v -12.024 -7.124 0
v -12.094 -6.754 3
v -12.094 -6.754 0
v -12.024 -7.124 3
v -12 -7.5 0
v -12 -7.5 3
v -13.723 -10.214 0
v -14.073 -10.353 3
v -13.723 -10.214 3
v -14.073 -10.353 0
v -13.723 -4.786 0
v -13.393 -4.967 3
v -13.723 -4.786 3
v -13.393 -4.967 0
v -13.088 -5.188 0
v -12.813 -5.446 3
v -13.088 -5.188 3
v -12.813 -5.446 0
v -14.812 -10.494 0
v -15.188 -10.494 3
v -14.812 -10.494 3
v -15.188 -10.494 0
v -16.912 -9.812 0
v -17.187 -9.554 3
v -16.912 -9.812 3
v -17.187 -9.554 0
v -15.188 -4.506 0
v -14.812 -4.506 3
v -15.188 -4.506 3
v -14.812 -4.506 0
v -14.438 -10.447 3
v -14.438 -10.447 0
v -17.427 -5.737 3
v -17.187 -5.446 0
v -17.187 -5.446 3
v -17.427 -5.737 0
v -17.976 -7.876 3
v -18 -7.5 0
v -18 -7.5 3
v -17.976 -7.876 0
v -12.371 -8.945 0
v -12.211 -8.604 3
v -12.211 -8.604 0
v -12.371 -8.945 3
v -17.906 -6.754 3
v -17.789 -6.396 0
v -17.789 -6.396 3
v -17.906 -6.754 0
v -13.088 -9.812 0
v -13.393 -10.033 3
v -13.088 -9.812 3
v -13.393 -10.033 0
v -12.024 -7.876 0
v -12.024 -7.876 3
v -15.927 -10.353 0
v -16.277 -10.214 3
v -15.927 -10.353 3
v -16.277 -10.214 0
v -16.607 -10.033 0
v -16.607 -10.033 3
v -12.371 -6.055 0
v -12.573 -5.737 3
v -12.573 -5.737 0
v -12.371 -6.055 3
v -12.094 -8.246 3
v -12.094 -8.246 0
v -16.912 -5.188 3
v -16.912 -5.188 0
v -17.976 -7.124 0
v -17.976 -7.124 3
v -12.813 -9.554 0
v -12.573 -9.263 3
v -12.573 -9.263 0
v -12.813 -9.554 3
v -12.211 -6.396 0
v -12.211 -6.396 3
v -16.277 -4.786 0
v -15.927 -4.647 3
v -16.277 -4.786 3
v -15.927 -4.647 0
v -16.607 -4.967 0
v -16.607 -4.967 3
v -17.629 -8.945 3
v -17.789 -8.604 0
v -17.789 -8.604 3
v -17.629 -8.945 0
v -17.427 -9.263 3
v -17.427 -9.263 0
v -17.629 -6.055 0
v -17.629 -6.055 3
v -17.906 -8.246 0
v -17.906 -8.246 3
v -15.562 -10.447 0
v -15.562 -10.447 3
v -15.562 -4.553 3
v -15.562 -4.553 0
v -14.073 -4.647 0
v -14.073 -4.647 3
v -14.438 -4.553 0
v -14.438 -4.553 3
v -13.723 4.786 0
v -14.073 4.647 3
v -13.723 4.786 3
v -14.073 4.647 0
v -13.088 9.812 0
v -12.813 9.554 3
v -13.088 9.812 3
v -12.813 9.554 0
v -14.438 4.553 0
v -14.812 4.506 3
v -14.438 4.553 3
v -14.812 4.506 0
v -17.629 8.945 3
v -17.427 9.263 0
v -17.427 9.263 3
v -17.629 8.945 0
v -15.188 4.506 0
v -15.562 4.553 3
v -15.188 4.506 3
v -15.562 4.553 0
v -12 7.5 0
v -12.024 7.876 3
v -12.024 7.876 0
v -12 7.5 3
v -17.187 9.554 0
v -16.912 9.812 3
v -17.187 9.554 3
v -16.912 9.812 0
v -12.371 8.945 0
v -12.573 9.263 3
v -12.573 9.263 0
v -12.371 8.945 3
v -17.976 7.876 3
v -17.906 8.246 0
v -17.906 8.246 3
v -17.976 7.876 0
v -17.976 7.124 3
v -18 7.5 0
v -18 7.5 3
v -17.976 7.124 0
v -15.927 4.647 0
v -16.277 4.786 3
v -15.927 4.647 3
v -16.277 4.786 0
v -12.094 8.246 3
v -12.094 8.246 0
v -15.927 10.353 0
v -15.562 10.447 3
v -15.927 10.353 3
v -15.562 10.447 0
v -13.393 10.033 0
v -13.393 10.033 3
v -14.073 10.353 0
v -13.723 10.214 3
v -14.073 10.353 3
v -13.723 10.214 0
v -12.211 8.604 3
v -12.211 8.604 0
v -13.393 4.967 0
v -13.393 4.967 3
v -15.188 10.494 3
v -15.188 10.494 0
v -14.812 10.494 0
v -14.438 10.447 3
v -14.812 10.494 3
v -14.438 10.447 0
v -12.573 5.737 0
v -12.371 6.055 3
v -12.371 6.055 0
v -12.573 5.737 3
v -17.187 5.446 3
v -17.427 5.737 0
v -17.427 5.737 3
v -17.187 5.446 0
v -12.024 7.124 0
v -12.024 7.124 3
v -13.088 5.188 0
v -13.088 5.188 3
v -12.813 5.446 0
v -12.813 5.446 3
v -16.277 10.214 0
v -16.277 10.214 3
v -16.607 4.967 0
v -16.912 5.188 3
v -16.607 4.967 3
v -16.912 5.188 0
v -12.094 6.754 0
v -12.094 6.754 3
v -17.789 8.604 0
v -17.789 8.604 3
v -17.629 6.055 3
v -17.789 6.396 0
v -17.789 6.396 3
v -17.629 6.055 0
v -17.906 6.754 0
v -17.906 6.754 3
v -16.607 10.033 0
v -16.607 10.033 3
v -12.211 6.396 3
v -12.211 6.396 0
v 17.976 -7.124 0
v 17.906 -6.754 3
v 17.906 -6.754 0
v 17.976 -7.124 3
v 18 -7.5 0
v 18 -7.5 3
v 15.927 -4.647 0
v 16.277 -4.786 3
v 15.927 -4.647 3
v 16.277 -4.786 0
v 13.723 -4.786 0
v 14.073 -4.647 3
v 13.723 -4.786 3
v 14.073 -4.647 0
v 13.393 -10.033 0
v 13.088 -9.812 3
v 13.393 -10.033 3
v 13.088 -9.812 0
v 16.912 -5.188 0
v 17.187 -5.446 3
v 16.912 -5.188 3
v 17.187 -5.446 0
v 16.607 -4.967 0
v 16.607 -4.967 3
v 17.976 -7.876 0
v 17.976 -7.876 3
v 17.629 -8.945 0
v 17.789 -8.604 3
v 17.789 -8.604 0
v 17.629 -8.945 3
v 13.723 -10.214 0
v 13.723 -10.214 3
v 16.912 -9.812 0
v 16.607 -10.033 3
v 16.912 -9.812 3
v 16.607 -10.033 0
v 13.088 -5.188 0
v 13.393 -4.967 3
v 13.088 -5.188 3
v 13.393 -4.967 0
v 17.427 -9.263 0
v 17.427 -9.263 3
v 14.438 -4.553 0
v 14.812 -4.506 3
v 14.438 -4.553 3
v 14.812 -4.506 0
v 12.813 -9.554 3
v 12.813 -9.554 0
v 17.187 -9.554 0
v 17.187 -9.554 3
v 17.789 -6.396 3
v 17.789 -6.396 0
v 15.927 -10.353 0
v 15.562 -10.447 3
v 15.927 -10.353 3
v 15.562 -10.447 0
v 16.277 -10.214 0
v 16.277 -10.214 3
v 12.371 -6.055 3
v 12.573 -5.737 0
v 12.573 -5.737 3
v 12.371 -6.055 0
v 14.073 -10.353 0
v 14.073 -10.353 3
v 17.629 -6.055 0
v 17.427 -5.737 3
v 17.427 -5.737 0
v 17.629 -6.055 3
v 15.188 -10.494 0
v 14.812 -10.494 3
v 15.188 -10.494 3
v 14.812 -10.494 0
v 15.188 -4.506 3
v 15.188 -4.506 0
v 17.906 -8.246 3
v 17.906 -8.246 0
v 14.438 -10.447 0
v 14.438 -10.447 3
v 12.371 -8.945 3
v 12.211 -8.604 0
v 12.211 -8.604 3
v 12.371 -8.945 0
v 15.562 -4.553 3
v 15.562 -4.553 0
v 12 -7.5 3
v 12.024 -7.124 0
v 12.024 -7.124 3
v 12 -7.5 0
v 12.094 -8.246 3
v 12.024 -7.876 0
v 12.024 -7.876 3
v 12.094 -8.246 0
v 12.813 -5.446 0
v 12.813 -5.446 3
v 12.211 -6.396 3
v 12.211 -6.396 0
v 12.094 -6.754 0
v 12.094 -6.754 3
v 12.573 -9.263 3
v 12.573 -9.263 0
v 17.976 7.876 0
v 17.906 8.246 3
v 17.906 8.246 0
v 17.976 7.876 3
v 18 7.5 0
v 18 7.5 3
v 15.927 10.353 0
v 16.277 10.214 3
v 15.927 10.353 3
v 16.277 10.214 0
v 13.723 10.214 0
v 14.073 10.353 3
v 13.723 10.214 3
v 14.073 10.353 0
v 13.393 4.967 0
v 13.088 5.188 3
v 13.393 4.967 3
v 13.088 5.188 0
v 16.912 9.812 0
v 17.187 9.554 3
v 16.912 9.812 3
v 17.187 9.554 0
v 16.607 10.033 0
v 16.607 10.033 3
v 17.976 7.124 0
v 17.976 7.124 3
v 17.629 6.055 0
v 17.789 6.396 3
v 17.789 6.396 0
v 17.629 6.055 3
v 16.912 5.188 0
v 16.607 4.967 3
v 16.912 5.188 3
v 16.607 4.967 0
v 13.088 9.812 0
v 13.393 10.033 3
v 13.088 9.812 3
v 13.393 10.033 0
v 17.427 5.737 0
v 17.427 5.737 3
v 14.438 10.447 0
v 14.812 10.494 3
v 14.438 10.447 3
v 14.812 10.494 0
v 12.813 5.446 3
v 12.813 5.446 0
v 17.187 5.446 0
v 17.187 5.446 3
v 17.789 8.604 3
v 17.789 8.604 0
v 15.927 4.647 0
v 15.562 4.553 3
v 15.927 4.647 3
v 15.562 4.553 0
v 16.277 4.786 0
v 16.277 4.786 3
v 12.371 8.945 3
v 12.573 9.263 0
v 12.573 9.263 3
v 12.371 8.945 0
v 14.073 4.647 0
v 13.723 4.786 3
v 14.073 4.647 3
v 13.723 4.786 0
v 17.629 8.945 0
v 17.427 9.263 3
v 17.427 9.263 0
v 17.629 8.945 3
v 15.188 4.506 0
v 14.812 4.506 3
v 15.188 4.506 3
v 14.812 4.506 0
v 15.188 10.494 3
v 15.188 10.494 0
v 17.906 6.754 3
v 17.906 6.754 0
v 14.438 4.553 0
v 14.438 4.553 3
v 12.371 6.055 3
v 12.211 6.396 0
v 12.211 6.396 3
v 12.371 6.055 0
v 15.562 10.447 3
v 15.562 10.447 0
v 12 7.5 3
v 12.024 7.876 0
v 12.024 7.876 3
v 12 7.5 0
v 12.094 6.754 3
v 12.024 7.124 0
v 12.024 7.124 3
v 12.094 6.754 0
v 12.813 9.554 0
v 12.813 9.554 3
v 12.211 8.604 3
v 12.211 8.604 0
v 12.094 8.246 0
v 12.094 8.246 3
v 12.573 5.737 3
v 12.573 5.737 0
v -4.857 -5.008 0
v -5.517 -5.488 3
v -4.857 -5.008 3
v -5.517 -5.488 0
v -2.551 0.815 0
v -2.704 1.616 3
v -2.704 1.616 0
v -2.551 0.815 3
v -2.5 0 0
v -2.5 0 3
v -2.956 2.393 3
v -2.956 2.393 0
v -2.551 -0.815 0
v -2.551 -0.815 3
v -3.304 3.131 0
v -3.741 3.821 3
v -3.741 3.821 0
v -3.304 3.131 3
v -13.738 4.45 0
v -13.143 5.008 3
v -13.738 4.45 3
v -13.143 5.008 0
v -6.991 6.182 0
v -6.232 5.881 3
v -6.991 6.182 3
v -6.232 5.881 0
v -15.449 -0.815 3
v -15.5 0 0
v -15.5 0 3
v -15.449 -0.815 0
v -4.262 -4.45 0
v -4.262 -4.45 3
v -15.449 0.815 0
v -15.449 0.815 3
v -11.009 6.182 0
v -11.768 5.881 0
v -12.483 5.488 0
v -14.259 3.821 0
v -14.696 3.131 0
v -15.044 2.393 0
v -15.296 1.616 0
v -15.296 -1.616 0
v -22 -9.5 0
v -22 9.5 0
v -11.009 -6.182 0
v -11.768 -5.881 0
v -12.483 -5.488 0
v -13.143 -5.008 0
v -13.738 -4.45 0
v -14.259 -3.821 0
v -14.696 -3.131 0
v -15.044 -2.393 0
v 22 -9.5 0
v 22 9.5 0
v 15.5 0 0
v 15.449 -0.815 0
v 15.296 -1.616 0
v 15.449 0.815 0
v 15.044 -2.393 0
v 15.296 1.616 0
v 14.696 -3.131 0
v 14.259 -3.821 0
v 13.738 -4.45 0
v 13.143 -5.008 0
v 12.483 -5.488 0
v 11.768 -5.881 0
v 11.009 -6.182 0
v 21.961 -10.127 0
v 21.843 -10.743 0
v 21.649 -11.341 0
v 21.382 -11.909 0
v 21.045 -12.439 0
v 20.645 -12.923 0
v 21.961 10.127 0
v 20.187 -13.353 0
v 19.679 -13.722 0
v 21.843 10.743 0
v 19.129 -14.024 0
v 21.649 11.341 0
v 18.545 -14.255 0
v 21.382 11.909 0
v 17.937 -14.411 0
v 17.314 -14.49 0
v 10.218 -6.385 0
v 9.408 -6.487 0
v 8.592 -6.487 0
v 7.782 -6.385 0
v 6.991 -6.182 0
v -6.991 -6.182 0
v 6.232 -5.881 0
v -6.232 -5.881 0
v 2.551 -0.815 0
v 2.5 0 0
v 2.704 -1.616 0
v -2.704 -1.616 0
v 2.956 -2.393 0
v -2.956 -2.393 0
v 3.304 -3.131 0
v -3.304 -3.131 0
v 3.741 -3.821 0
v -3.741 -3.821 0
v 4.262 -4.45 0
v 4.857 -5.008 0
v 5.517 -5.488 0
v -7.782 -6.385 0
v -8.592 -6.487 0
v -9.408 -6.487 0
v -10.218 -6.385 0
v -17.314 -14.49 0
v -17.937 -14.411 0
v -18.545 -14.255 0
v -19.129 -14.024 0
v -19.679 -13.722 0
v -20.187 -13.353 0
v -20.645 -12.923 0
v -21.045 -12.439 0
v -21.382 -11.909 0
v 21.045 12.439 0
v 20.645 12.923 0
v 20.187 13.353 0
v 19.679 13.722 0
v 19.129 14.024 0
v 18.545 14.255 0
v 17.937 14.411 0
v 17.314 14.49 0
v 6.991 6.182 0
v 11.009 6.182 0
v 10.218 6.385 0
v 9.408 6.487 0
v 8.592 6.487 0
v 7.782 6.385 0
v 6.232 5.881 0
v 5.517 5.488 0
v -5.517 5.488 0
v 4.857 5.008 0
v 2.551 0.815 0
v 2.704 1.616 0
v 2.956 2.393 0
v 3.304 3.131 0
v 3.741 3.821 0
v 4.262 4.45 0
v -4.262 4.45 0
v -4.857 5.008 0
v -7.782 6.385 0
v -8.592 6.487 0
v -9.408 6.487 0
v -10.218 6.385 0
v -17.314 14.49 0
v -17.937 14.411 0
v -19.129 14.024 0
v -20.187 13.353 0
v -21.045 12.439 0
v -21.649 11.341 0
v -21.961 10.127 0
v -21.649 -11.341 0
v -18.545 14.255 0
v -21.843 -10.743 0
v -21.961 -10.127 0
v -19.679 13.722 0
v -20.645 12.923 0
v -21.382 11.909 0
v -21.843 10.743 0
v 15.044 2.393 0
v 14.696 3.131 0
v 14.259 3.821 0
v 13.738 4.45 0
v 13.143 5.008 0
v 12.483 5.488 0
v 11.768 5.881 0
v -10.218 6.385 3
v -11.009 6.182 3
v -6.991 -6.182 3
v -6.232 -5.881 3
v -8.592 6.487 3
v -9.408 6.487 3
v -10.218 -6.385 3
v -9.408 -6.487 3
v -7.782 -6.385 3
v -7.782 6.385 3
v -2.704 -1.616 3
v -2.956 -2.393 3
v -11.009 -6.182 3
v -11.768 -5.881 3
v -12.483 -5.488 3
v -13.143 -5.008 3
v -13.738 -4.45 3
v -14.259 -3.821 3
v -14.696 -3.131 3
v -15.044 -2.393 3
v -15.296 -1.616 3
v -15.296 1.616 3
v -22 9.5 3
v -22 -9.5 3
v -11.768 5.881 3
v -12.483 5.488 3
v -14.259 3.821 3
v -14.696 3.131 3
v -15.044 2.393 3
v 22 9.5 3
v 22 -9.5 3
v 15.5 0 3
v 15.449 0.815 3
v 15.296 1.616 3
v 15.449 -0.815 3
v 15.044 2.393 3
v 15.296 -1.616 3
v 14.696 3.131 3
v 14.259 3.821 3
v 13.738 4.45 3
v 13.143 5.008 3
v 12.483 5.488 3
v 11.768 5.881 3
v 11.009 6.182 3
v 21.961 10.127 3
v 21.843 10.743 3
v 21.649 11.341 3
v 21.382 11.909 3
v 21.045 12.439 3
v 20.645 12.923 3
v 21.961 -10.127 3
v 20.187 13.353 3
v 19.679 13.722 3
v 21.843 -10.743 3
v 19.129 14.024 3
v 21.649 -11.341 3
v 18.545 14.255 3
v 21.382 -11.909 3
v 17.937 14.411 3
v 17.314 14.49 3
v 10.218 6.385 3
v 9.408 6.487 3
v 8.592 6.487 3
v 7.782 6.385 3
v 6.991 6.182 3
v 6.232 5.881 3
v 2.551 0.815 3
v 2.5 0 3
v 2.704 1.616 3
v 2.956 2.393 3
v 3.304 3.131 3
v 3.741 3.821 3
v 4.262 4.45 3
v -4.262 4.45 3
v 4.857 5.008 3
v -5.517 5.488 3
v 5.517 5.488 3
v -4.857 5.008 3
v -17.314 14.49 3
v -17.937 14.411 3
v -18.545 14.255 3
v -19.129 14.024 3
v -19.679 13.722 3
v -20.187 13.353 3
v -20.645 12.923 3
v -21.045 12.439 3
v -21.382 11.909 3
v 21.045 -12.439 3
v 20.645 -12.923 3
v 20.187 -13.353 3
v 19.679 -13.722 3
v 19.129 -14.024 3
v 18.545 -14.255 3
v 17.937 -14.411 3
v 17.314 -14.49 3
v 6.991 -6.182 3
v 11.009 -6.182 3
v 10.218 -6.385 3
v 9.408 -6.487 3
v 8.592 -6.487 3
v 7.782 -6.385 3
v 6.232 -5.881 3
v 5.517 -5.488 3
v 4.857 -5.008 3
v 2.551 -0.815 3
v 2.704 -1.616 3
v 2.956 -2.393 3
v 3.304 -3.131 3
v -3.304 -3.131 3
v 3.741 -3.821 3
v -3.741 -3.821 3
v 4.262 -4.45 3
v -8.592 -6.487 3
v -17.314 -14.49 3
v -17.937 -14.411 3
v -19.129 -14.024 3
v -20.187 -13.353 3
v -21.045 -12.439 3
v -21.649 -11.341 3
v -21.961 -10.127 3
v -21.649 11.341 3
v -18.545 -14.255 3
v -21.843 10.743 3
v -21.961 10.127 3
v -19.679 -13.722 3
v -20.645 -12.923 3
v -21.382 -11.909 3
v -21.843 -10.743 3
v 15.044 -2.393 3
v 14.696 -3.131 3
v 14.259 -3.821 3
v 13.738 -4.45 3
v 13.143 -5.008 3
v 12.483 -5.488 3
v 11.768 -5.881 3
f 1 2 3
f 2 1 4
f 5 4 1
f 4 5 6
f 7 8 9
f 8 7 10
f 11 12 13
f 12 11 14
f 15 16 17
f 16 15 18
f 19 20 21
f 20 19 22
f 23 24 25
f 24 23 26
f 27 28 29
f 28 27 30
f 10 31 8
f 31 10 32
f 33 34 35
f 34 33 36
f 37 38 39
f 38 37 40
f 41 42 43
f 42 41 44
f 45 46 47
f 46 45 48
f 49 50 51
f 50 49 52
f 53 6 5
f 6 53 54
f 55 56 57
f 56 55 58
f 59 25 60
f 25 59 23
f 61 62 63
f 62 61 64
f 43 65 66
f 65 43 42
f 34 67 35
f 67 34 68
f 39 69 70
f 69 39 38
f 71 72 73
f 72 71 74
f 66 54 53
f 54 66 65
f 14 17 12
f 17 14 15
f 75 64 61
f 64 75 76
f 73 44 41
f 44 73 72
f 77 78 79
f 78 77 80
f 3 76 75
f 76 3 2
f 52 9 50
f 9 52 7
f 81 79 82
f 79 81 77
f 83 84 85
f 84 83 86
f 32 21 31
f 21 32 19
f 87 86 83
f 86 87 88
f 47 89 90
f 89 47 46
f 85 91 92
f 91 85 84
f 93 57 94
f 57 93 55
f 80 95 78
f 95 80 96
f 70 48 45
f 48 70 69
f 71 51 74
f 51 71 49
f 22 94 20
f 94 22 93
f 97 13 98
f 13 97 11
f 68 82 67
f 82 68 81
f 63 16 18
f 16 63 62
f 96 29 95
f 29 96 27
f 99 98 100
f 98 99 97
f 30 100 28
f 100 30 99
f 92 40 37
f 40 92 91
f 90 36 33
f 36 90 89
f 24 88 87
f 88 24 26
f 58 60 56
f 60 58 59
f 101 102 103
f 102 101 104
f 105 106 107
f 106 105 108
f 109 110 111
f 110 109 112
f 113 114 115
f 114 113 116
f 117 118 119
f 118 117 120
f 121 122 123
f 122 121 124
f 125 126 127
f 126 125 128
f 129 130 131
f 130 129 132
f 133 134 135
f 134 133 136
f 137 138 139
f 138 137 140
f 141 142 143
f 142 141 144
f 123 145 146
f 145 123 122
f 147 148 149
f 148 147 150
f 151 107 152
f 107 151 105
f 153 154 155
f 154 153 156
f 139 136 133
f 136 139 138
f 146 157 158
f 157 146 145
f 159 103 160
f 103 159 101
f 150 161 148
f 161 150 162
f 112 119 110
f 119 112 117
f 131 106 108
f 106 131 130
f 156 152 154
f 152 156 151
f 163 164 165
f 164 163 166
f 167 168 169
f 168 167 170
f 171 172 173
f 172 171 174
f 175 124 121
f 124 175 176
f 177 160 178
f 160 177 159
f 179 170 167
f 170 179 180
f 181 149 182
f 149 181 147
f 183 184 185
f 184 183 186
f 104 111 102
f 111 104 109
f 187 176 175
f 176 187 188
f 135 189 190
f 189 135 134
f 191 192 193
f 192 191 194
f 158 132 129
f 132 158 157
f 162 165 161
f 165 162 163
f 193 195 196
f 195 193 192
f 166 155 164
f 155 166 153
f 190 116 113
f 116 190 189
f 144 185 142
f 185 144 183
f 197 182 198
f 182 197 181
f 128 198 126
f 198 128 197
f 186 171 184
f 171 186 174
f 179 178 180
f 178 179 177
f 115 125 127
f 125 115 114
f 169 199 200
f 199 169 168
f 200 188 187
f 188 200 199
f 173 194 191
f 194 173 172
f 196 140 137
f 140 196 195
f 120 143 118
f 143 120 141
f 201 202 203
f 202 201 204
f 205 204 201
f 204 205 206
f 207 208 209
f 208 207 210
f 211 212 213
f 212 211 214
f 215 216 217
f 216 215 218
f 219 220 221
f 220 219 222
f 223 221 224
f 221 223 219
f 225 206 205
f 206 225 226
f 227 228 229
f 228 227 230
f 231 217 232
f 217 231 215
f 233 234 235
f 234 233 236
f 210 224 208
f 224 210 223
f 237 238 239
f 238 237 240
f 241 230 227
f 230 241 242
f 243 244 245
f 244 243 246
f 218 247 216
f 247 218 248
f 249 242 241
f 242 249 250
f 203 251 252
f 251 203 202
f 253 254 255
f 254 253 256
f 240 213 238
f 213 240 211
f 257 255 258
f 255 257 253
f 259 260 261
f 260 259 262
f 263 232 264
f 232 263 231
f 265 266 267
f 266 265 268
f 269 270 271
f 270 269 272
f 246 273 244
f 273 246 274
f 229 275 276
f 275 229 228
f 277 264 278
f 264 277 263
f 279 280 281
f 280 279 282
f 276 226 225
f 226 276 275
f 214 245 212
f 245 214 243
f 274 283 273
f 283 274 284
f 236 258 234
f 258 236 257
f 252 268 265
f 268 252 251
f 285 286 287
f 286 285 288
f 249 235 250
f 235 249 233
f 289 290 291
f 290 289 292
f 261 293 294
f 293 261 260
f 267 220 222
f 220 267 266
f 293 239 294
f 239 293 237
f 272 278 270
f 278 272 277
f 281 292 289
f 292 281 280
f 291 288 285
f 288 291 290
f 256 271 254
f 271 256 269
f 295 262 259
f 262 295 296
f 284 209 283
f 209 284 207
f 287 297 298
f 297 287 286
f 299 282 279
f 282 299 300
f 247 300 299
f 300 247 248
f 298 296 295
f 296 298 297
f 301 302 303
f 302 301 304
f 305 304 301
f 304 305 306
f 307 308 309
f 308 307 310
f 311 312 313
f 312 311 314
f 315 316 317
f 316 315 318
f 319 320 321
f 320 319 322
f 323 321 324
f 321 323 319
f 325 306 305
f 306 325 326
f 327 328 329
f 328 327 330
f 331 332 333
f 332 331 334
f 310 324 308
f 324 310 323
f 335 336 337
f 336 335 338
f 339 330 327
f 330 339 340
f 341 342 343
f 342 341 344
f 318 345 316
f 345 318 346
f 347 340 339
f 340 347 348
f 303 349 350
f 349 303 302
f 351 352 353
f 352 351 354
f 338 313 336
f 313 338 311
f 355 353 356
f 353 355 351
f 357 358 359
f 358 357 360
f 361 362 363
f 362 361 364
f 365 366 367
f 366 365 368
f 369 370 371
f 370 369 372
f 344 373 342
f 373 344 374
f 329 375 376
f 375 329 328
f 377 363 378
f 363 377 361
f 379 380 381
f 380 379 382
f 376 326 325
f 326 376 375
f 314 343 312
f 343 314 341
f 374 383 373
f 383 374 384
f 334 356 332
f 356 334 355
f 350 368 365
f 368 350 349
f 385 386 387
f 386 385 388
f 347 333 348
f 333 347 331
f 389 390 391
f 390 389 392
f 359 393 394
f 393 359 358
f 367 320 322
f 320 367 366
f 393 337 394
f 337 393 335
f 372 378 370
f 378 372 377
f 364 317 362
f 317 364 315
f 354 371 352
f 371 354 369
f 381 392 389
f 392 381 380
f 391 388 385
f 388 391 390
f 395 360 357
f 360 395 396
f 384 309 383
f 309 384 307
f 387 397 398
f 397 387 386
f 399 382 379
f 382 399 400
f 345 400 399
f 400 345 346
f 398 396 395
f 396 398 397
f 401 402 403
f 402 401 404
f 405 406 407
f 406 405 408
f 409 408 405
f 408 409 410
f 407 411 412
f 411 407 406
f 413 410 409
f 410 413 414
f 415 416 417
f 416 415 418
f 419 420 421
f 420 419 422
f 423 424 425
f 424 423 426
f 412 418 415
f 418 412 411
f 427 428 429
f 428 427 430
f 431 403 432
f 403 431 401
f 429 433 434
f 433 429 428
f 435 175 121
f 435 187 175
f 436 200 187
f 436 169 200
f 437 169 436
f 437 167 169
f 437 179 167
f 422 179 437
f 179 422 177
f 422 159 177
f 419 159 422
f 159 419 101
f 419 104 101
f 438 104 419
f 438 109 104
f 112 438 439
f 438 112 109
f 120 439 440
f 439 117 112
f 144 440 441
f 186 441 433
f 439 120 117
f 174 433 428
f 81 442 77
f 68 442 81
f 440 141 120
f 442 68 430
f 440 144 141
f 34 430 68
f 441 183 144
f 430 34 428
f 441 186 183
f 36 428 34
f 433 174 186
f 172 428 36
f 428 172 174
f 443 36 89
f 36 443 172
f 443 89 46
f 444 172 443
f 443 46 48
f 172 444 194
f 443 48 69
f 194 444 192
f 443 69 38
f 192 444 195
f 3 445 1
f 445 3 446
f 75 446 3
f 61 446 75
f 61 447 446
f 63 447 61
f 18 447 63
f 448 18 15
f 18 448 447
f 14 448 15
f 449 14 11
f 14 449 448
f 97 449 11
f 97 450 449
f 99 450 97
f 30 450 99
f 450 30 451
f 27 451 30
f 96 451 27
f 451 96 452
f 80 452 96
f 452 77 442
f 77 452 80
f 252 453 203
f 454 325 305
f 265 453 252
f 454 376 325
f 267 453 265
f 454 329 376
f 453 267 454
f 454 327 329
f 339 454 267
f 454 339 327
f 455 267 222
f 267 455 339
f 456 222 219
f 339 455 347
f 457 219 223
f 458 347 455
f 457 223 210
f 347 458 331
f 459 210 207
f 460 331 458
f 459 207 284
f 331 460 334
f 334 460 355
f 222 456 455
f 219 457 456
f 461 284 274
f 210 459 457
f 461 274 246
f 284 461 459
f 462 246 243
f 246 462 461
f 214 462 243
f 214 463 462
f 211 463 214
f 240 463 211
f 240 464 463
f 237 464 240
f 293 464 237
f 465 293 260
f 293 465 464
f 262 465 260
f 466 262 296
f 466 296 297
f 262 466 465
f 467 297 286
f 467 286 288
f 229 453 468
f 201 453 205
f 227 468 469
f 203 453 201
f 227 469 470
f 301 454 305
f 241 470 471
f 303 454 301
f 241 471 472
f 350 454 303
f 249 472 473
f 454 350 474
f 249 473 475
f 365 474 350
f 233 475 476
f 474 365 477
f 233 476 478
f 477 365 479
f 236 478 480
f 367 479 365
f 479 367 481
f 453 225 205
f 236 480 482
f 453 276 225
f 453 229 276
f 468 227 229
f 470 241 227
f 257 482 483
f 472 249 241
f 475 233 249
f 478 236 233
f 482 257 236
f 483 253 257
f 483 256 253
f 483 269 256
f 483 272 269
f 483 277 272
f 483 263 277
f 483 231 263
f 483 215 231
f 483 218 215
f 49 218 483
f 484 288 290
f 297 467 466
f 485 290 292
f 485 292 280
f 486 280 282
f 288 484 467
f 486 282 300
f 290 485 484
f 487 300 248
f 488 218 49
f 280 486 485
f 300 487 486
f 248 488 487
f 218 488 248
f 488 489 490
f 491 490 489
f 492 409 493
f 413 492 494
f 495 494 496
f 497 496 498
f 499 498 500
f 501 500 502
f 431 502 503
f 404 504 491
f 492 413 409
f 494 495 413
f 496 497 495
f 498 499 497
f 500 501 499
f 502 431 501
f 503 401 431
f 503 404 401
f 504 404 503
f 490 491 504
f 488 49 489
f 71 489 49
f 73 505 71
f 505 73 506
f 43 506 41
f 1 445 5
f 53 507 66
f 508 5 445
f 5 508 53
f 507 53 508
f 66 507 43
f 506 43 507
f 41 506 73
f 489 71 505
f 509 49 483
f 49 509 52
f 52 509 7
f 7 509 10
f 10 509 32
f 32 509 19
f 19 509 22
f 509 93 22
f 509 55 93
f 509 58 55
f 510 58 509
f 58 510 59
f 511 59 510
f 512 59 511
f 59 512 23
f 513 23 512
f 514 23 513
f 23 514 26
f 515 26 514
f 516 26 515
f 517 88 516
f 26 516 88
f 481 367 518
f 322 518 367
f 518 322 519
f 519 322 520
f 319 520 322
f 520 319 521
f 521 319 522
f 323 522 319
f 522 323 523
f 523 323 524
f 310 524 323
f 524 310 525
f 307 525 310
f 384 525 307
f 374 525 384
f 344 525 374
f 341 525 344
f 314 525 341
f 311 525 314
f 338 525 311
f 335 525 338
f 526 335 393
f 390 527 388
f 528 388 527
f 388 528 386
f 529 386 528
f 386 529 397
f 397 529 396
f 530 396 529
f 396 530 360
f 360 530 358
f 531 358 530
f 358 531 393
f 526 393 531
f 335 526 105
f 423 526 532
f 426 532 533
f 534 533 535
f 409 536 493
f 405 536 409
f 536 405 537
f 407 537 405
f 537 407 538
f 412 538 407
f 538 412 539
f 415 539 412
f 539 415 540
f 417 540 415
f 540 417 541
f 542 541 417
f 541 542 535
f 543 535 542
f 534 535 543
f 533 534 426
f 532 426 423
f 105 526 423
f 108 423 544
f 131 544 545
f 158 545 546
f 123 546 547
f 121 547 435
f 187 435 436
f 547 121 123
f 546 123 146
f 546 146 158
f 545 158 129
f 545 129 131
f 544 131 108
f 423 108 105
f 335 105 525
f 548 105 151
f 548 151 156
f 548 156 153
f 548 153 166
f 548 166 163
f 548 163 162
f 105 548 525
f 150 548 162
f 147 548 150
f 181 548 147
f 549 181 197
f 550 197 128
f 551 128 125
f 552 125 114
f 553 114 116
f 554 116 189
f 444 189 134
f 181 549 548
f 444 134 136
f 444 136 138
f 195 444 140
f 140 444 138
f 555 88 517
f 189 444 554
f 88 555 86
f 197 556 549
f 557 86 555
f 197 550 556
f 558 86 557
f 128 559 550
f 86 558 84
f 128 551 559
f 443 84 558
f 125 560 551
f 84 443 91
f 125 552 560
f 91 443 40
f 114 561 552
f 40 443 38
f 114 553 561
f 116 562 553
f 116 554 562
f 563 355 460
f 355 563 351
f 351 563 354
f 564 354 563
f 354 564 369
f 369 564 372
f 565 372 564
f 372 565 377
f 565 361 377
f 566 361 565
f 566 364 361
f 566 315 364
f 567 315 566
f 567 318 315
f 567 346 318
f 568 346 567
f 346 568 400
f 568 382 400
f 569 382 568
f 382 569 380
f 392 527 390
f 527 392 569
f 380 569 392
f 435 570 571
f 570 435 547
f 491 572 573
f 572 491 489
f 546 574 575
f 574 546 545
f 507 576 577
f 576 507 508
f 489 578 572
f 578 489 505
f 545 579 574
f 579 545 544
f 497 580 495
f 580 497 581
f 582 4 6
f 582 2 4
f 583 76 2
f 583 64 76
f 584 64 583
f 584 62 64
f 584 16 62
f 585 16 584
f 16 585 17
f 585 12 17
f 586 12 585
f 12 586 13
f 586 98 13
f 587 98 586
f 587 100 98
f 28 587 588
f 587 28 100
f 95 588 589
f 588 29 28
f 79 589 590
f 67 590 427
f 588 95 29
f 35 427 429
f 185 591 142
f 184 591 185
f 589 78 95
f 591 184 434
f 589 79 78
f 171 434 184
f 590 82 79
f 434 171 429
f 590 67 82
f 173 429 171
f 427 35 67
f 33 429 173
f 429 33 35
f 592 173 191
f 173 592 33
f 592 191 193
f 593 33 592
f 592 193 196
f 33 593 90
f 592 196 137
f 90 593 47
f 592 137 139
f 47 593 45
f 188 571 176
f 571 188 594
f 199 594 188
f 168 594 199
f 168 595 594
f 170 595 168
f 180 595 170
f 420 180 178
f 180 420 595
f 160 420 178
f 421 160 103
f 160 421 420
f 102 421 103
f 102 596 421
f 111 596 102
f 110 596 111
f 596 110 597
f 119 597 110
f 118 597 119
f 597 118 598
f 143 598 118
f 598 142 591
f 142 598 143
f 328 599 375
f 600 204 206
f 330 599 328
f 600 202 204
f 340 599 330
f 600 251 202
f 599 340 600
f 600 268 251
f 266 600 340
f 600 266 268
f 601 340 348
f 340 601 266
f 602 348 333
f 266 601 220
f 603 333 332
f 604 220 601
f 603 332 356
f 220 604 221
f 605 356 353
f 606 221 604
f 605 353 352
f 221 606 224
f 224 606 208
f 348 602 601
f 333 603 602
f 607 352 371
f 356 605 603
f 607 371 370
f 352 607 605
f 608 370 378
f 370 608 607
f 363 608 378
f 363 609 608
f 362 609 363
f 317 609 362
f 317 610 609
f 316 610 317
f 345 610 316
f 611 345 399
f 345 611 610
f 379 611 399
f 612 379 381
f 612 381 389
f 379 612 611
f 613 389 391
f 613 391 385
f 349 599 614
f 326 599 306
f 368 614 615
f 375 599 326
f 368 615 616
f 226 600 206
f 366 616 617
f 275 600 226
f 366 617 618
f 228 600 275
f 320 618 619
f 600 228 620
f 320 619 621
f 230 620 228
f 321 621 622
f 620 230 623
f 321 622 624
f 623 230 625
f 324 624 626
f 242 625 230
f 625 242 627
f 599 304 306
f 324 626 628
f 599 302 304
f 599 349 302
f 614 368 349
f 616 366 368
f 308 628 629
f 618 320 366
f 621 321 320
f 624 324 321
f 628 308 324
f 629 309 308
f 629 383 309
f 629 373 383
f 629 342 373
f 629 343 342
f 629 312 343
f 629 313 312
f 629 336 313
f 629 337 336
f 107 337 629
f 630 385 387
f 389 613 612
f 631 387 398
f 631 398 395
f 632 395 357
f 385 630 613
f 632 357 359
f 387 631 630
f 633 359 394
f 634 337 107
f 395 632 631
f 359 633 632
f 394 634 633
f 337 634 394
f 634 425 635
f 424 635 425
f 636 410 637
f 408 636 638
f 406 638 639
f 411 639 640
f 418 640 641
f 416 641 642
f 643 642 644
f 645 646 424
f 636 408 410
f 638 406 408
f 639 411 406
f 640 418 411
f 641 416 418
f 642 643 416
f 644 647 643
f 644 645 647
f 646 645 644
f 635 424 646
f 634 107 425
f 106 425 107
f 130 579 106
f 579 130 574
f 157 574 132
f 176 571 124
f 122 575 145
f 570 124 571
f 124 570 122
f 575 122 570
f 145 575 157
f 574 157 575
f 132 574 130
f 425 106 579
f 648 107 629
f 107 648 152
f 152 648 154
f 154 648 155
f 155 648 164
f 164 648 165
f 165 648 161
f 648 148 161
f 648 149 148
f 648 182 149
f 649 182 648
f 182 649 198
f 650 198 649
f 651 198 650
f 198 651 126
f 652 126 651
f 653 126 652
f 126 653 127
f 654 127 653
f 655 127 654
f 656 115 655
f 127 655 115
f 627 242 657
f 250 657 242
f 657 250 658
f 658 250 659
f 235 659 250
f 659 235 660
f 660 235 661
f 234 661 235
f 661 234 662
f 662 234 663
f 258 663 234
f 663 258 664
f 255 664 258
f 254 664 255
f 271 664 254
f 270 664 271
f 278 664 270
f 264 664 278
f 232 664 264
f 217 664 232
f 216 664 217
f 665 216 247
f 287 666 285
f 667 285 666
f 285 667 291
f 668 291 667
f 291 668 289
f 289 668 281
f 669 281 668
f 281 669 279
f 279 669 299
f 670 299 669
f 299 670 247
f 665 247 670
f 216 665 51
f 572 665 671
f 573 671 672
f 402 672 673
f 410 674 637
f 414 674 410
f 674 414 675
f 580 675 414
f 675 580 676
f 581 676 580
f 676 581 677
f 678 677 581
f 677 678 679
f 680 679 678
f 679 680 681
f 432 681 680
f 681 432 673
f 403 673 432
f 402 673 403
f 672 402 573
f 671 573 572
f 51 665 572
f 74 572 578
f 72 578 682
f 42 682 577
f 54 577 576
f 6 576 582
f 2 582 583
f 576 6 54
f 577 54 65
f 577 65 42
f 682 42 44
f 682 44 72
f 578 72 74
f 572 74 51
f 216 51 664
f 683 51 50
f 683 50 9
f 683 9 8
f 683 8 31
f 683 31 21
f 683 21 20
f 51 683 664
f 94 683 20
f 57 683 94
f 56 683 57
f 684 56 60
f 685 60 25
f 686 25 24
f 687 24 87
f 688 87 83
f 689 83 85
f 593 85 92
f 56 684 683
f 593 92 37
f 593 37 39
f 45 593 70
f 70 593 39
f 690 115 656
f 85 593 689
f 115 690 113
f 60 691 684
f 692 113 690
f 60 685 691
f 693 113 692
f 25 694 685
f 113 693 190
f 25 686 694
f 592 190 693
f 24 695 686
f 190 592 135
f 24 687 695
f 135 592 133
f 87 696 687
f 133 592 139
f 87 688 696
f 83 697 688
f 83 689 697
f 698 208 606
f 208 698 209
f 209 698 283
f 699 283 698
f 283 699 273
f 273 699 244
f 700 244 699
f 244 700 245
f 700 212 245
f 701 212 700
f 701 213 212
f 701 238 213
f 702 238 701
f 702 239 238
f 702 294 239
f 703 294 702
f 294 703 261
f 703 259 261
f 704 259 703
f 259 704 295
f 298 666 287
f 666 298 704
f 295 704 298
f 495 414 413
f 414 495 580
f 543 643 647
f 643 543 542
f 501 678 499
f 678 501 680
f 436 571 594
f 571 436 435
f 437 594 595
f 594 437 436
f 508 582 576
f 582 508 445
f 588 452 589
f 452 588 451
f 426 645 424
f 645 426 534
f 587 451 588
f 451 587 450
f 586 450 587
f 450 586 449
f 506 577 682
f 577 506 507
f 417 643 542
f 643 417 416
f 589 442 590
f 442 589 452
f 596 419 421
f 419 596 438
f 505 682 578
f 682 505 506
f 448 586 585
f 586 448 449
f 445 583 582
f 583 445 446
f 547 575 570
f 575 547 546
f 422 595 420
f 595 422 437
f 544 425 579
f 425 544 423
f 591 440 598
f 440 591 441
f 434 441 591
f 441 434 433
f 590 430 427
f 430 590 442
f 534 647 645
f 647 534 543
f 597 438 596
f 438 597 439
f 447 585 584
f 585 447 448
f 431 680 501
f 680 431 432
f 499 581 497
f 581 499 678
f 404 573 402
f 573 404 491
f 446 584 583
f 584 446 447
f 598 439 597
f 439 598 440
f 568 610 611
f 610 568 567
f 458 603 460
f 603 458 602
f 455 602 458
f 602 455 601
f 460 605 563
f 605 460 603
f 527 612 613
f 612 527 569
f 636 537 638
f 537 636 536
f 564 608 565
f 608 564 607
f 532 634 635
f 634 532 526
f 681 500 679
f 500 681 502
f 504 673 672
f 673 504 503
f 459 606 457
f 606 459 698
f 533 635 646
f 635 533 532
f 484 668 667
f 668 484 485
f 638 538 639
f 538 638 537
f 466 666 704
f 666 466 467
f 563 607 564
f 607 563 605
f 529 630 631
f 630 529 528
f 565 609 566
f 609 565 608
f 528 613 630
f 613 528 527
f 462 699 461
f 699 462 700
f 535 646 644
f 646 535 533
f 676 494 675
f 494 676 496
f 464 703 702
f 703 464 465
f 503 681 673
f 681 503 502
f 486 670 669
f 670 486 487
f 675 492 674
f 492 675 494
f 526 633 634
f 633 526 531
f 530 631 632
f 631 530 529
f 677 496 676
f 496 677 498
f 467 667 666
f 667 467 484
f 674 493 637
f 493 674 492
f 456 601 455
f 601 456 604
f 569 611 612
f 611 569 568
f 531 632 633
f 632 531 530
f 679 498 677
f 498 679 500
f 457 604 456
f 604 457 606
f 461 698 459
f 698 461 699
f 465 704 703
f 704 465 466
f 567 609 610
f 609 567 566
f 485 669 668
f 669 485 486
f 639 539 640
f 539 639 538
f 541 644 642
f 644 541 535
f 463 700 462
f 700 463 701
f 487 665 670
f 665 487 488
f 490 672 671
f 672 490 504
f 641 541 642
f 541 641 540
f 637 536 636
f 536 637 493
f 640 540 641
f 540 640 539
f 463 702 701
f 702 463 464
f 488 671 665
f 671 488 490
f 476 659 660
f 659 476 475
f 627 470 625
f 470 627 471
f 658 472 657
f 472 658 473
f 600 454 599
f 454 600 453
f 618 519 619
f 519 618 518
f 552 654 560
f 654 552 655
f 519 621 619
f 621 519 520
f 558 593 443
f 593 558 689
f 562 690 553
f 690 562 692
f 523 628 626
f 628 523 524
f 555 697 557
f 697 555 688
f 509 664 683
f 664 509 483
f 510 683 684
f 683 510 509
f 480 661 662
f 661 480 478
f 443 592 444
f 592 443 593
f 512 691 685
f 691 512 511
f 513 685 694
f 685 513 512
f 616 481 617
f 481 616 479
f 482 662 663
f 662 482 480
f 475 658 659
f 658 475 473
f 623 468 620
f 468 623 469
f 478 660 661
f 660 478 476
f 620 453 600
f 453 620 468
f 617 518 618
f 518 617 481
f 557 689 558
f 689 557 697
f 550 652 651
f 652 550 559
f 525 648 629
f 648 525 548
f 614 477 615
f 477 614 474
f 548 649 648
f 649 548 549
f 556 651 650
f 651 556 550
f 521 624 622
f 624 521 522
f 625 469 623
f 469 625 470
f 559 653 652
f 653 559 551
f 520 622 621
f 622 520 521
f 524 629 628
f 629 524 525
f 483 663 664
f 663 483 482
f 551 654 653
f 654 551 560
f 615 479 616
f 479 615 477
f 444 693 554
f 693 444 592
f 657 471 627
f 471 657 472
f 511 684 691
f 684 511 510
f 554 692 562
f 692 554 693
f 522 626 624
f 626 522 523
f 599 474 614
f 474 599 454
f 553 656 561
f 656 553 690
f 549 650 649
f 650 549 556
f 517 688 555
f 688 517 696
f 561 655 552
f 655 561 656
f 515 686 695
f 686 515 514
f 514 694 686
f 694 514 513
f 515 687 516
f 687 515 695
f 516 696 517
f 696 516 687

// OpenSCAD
$fn = 50;


difference() {
	union() {
		hull() {
			translate(v = [-17.0000000000, 9.5000000000, 0]) {
				cylinder(h = 3, r = 5);
			}
			translate(v = [17.0000000000, 9.5000000000, 0]) {
				cylinder(h = 3, r = 5);
			}
			translate(v = [-17.0000000000, -9.5000000000, 0]) {
				cylinder(h = 3, r = 5);
			}
			translate(v = [17.0000000000, -9.5000000000, 0]) {
				cylinder(h = 3, r = 5);
			}
		}
	}
	union() {
		#translate(v = [-15.0000000000, -7.5000000000, -100.0000000000]) {
			cylinder(h = 200, r = 3.0000000000);
		}
		#translate(v = [-15.0000000000, 7.5000000000, -100.0000000000]) {
			cylinder(h = 200, r = 3.0000000000);
		}
		#translate(v = [15.0000000000, -7.5000000000, -100.0000000000]) {
			cylinder(h = 200, r = 3.0000000000);
		}
		#translate(v = [15.0000000000, 7.5000000000, -100.0000000000]) {
			cylinder(h = 200, r = 3.0000000000);
		}
		#translate(v = [-9.0000000000, 0, 0]) {
			cylinder(h = 3, r = 6.5000000000);
		}
		#translate(v = [9.0000000000, 0, 0]) {
			cylinder(h = 3, r = 6.5000000000);
		}
	}
}
